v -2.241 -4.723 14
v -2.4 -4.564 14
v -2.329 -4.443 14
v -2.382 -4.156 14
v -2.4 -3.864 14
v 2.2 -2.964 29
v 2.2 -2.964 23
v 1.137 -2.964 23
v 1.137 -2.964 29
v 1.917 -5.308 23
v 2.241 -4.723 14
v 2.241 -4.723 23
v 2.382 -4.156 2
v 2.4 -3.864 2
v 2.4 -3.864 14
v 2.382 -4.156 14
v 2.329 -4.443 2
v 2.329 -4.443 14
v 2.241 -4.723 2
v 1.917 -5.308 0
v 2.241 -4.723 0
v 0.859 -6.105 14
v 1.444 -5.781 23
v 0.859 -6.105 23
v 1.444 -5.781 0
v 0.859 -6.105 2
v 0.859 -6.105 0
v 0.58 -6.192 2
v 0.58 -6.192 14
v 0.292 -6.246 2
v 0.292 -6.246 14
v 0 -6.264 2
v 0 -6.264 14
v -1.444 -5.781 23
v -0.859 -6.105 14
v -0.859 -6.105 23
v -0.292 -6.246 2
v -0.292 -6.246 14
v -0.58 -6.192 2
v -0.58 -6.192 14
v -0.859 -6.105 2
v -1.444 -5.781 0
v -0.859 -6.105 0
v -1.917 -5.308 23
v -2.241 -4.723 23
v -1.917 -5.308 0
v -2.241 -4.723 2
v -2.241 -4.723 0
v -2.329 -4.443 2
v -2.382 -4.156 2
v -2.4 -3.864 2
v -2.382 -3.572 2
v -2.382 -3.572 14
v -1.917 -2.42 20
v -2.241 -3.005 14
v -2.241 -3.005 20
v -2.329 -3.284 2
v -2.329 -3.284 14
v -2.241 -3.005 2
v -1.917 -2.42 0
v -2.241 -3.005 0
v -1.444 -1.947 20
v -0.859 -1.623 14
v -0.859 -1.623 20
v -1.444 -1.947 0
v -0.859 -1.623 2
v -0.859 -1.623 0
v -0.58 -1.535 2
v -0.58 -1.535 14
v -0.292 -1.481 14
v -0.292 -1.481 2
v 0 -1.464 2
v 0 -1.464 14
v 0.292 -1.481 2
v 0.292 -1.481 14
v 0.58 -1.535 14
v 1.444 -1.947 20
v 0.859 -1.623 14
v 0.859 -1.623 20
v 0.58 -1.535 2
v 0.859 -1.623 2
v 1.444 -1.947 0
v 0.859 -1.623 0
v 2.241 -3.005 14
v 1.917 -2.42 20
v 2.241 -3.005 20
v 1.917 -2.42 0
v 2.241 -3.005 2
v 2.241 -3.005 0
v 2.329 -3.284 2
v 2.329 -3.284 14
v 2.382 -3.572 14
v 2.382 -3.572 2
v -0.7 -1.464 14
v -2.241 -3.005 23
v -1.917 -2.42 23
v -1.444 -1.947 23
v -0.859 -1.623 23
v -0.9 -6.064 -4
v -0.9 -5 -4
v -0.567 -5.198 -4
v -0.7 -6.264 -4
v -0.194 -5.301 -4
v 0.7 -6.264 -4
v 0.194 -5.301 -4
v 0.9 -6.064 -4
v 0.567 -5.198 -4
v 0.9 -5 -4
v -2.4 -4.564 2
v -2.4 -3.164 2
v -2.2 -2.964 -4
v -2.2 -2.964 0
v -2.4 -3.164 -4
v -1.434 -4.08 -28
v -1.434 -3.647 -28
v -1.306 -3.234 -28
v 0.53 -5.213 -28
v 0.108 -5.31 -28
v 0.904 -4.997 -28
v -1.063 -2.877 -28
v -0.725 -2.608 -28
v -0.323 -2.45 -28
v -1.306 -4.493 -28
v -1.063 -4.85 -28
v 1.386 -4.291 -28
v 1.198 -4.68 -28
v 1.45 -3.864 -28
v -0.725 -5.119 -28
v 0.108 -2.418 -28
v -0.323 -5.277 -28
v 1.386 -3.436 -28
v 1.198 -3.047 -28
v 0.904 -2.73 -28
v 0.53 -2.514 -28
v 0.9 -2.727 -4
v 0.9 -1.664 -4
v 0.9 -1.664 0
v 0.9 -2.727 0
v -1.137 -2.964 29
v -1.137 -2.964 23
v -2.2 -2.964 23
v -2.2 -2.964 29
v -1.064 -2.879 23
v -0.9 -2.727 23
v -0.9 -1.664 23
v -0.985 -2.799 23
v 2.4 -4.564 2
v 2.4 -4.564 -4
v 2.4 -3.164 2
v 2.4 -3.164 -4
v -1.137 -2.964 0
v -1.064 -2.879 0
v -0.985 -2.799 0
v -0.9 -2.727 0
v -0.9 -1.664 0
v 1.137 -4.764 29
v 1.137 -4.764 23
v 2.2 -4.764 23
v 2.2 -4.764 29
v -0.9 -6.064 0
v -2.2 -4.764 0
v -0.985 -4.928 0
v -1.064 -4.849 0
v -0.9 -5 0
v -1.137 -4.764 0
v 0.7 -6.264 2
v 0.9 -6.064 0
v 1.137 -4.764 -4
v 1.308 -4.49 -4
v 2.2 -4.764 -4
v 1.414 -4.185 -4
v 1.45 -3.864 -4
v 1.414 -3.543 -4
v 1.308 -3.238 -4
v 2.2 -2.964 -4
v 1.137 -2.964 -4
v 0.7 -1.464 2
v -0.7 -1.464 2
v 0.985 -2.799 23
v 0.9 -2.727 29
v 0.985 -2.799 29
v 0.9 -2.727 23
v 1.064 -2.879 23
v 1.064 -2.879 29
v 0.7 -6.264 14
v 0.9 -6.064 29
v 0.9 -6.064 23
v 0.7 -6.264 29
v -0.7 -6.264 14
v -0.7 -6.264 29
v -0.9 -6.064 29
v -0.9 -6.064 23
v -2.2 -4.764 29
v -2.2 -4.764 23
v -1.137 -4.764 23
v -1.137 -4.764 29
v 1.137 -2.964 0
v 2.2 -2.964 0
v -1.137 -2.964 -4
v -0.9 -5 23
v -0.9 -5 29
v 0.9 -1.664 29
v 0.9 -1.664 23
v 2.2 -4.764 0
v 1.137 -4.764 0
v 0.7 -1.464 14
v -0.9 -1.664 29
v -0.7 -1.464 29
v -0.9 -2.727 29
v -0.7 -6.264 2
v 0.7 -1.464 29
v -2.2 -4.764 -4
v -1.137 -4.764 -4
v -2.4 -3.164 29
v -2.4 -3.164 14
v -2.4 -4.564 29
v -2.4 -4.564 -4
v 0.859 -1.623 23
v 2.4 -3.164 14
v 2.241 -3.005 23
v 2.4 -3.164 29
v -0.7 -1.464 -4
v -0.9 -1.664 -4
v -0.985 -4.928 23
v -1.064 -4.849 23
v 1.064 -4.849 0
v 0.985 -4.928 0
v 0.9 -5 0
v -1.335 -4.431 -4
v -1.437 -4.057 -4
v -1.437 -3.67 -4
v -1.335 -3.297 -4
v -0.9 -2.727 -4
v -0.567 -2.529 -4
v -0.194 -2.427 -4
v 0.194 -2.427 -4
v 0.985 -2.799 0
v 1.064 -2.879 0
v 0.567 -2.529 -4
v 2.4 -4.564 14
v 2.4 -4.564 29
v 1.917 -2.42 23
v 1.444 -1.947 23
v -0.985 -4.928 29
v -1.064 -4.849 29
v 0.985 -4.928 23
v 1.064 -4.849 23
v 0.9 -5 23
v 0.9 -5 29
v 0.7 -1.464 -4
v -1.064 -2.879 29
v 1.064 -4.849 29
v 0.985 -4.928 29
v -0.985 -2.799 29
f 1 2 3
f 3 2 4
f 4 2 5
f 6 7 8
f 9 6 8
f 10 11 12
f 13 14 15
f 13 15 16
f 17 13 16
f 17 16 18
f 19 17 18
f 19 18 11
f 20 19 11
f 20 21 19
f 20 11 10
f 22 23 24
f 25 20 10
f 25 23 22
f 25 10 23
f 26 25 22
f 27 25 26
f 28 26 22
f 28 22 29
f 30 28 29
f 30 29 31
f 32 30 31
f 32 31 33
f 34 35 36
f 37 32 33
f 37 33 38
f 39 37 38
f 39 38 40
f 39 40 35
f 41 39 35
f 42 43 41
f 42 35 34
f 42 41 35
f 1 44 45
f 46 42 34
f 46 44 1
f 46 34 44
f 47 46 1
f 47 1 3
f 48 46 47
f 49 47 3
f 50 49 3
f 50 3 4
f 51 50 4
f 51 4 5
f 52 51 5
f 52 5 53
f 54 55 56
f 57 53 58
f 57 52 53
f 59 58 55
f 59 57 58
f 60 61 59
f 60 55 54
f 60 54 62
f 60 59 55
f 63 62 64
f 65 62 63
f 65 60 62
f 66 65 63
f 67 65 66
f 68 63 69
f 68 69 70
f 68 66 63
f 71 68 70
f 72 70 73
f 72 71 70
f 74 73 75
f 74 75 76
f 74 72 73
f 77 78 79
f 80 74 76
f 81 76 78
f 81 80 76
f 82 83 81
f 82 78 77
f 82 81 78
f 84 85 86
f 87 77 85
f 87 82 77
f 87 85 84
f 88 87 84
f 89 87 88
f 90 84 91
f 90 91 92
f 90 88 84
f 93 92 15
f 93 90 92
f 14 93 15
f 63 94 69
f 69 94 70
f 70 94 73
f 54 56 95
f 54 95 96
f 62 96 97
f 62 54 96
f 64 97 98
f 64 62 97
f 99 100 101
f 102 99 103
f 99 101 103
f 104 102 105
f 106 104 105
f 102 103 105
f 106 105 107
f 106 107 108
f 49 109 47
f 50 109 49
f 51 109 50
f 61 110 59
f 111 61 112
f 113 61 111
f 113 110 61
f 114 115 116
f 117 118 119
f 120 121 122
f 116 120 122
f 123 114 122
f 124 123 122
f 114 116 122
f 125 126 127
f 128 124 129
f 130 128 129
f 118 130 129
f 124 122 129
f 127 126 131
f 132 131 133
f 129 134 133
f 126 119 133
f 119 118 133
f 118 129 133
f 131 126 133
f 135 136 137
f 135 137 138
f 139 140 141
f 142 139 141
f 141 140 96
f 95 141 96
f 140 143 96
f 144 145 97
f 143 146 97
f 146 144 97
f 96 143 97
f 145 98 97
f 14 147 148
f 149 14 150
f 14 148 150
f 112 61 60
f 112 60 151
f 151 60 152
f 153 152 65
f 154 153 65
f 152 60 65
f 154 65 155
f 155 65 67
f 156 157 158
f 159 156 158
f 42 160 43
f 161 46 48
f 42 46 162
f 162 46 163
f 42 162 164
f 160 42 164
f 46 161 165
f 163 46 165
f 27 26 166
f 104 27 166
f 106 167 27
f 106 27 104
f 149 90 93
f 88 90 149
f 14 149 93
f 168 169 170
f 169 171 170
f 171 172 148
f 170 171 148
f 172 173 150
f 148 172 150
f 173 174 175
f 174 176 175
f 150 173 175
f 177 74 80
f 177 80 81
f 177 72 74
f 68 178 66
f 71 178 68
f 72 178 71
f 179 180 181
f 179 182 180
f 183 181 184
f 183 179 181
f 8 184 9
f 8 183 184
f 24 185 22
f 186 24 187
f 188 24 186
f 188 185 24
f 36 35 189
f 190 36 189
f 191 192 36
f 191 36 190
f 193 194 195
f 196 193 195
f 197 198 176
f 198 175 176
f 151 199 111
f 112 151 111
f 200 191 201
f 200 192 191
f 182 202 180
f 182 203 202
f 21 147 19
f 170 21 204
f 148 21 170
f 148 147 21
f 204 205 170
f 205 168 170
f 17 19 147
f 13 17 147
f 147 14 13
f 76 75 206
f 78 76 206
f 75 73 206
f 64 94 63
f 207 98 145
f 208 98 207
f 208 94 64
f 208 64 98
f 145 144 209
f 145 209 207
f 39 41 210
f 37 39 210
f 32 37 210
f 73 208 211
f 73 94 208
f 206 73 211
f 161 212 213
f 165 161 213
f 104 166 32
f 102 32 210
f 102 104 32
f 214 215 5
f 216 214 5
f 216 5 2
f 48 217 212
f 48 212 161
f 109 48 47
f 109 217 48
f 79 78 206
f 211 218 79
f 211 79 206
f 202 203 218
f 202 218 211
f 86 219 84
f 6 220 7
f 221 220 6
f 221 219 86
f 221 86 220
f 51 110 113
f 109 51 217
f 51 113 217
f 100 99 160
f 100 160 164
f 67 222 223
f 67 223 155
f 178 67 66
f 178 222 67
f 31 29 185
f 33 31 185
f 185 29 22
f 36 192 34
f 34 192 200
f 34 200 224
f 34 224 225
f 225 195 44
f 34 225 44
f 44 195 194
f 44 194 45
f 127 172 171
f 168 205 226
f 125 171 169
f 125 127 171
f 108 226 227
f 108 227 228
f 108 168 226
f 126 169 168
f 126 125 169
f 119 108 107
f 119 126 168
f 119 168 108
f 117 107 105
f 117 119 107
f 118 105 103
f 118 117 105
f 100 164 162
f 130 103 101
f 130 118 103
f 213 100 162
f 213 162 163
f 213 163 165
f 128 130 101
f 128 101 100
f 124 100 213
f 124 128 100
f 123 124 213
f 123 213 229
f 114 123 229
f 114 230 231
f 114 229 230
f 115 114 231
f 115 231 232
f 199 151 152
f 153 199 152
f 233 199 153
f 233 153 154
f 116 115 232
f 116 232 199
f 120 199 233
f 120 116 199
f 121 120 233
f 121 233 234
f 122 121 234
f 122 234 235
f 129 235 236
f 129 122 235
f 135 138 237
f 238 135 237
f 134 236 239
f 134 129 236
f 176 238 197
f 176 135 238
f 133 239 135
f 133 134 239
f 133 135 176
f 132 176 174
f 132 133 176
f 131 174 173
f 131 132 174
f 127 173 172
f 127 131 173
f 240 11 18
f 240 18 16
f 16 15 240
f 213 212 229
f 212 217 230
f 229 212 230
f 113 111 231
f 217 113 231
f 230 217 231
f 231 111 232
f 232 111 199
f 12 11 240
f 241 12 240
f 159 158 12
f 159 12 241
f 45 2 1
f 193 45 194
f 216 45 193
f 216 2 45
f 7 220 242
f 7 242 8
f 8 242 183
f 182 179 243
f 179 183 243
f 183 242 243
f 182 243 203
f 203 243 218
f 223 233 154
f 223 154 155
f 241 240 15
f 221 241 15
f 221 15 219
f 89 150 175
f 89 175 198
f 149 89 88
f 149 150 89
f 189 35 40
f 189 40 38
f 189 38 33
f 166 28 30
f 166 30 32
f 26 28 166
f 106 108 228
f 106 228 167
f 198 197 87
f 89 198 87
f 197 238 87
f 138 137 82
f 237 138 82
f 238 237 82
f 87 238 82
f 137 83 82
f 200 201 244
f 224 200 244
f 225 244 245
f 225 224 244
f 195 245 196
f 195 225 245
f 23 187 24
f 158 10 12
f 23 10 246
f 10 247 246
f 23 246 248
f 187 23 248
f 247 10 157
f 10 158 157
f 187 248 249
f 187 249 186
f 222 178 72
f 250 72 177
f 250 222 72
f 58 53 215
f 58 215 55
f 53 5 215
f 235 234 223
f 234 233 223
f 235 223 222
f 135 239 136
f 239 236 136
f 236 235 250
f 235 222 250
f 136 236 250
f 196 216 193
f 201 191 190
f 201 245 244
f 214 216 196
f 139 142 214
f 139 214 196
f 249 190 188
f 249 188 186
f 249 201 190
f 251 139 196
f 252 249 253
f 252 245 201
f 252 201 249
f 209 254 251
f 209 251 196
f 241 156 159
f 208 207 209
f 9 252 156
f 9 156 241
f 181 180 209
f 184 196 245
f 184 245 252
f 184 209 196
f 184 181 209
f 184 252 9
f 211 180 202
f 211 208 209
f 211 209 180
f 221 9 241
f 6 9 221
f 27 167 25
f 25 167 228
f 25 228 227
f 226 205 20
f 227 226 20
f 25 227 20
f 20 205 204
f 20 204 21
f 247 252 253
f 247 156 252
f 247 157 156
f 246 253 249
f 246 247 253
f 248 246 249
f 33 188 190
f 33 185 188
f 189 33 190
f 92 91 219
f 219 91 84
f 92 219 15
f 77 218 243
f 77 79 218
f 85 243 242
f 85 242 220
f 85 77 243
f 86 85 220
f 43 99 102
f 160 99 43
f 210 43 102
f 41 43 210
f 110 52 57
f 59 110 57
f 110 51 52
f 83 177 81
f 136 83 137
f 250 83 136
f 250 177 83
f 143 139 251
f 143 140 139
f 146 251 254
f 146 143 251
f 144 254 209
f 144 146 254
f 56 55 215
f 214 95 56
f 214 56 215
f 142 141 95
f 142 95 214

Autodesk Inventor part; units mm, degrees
ref_plane "YZ Plane" through (0, 0, 0) normal (1, 0, 0) x (0, 1, 0)
sketch "Boceto2" plane through (0, 0, 0) normal (0, 0, 1) x (1, 0, 0)
  line L0 (0.9, -6.2636) -> (-0.9, -6.2636)
  line L1 (-0.9, -6.2636) -> (-0.9, -1.4636)
  line L2 (-0.9, -1.4636) -> (0.9, -1.4636)
  line L3 (0.9, -1.4636) -> (0.9, -6.2636)
  line L4 (0.9, -6.2636) -> (-0.9, -1.4636) construction
  line L5 (-0.9, -6.2636) -> (0.9, -1.4636) construction
  line L6 (-2.4, -4.7636) -> (2.4, -4.7636)
  line L7 (2.4, -4.7636) -> (2.4, -2.9636)
  line L8 (2.4, -2.9636) -> (-2.4, -2.9636)
  line L9 (-2.4, -2.9636) -> (-2.4, -4.7636)
  line L10 (-2.4, -4.7636) -> (2.4, -2.9636) construction
  line L11 (2.4, -4.7636) -> (-2.4, -2.9636) construction
  circle A0 centre (0, -3.8636) radius 1.45
  point P0 (0, 0)
  point P1 (1.1369, -2.9636)
  point P2 (0.9, -2.7267)
  point P3 (-0.9, -2.7267)
  point P4 (-1.1369, -2.9636)
  point P5 (-1.1369, -4.7636)
  point P6 (-0.9, -5.0005)
  point P7 (0.9, -5.0005)
  point P8 (1.1369, -4.7636)
  dimension "d0" = 4.8
  dimension "d1" = 1.8
  dimension "d2" = 1.8
  dimension "d3" = 4.8
  dimension "d4" = 2.9
extrude "Extrusión1" add sketch "Boceto2" along normal blind 2 and the other way blind 4
sketch "Boceto3" plane through (0, 0, 2) normal (0, 0, 1) x (1, 0, 0)
  arc A0 (-0.9, -2.7267) -> (-1.1369, -2.9636) centre (0, -3.8636) ccw construction
  circle A1 centre (0, -3.8636) radius 1.45
  arc A2 (1.1369, -2.9636) -> (0.9, -2.7267) centre (0, -3.8636) ccw construction
  point P0 (0, 0)
  point P1 (1.0253, -2.8383)
extrude "Extrusión2" add sketch "Boceto3" along normal blind 12 and the other way blind 30
sketch "Boceto4" plane through (0, -3.8636, 14) normal (0, 0, 1) x (1, 0, 0)
  circle A0 centre (0, 0) radius 1.45 construction
  circle A1 centre (0, 0) radius 1.45
  line L0 (-0.9, 2.4) -> (0.9, 2.4) construction
  line L1 (0.9, -2.4) -> (-0.9, -2.4)
  line L2 (-0.9, -2.4) -> (-0.9, 2.4)
  line L3 (-0.9, 2.4) -> (0.9, 2.4)
  line L4 (0.9, 2.4) -> (0.9, -2.4)
  line L5 (0.9, -2.4) -> (-0.9, 2.4) construction
  line L6 (-0.9, -2.4) -> (0.9, 2.4) construction
  line L7 (2.4, 0.9) -> (-2.4, 0.9)
  line L8 (-2.4, 0.9) -> (-2.4, -0.9)
  line L9 (-2.4, -0.9) -> (2.4, -0.9)
  line L10 (2.4, -0.9) -> (2.4, 0.9)
  line L11 (2.4, 0.9) -> (-2.4, -0.9) construction
  line L12 (-2.4, 0.9) -> (2.4, -0.9) construction
  point P0 (1.1369, 0.9)
  point P1 (0.9, 1.1369)
  point P2 (-0.9, 1.1369)
  point P3 (-1.1369, 0.9)
  point P4 (-1.1369, -0.9)
  point P5 (-0.9, -1.1369)
  point P6 (0.9, -1.1369)
  point P7 (1.1369, -0.9)
extrude "Extrusión3" add sketch "Boceto4" along normal blind 15
chamfer "Chaflán1" distance 0.2 angle 45 16 edges at (0.9, -1.4636, -1) (-0.9, -1.4636, -1) (-2.4, -2.9636, -1) (-2.4, -4.7636, -1) (-0.9, -6.2636, -1) (0.9, -6.2636, -1) (2.4, -4.7636, -1) (2.4, -2.9636, -1) (2.4, -2.9636, 21.5) (0.9, -1.4636, 21.5) (-0.9, -1.4636, 21.5) (-2.4, -2.9636, 21.5) (-2.4, -4.7636, 21.5) (-0.9, -6.2636, 21.5) (0.9, -6.2636, 21.5) (2.4, -4.7636, 21.5)
ref_plane "Plano de trabajo1" through (0, -3.8636, 23) normal (0, 0, -1) x (-1, 0, 0)
sketch "Boceto5" plane through (0, -3.8636, 23) normal (0, 0, -1) x (-1, 0, 0)
  circle A0 centre (0, 0) radius 1.45 construction
  circle A1 centre (0, 0) radius 2.4
  line L0 (0.7, 2.4) -> (-0.7, 2.4) construction
  point P0 (0, 3.8636)
  point P1 (0, 2.4)
extrude "Extrusión4" add sketch "Boceto5" along normal blind 3
ref_plane "Plano de trabajo2" through (0, 0, 0) normal (0, 0, 1) x (1, 0, 0)
sketch "Boceto6" plane through (0, 0, 0) normal (0, 0, 1) x (1, 0, 0)
  arc A0 (-0.859, -1.6226) -> (-2.241, -3.0046) centre (0, -3.8636) ccw construction
  circle A1 centre (0, -3.8636) radius 2.4
  line L0 (0.7, -1.4636) -> (-0.7, -1.4636) construction
  point P0 (0, 0)
  point P1 (0, -1.4636)
extrude "Extrusión5" add sketch "Boceto6" along normal up to surface (20 mm away)
properties part number "EjeCilintroSuperiorGarra"
